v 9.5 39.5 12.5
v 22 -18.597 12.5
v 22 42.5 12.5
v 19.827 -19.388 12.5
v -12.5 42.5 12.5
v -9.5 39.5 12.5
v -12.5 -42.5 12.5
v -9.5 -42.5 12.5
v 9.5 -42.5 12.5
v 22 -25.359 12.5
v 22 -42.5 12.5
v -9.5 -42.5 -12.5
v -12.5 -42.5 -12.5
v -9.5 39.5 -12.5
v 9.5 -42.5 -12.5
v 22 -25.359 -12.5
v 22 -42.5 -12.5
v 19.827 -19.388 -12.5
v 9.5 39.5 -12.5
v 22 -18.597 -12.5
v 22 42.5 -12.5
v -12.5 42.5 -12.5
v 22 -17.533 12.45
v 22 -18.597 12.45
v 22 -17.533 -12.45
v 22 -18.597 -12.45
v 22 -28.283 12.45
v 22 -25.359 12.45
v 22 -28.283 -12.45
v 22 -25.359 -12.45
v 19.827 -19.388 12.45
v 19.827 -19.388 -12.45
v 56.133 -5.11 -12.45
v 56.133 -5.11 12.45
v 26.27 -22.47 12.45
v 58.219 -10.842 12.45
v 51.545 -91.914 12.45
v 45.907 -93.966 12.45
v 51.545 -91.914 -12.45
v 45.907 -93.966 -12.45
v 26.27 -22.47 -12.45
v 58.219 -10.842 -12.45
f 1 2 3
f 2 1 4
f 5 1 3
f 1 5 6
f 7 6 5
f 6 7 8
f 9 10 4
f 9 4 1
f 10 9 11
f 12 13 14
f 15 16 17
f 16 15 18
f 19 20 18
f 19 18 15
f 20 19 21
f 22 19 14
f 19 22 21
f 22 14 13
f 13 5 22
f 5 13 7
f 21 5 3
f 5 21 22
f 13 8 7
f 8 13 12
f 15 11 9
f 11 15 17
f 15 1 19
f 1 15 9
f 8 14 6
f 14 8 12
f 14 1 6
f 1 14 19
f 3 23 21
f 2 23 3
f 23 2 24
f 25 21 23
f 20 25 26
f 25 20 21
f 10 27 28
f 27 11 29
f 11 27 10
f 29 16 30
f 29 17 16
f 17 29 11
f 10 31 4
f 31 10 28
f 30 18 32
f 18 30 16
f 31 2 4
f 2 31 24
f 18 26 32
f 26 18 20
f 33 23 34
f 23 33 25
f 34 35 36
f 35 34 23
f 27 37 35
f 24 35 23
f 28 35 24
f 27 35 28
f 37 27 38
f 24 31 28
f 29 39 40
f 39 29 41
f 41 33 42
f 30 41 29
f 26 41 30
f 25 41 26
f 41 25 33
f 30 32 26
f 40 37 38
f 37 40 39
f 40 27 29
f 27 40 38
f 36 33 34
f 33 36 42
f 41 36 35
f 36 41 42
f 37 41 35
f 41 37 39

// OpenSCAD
    union() {
        union() {
            difference(){
                color("blue") cube ([25, 85, 25], center=true);
                color("red") translate ([0, -3, 0]) cube ([19, 85, 200], center=true);
            }
        }

        color("yellow")
            difference(){
                translate([17, 0, 0]) difference() {
                    cube ([10, 85, 25], center=true);
                }
                rotate(a=110) translate([-65, -32, 0]) union() {
                        color("blue") cube ([80, 40, 25.1], center=true);
                    }
                }


        rotate(a=110)
            translate([-64, -31, 0]) union() {
                difference(){
                    color("blue") cube ([80, 40, 24.9], center=true);
                    color("red") translate ([-6.1, -6, 0]) cube ([80, 40, 200], center=true);
                }
            }





        *color("yellow")
            rotate(a=135)
                translate([7.5, 38.41, -10]) difference() {
                    cube ([30, 2, 20]);
                }

        *color("pink")
            rotate(a=45)
                translate([-40.5, 7.41, -10]) difference() {
                    cube ([50, 2, 20]);
                }

        *color("orange") 
            rotate(a=135) 
                translate([-4, -9.6, -10]) 
                    cube ([12, 2, 20]);
    }
